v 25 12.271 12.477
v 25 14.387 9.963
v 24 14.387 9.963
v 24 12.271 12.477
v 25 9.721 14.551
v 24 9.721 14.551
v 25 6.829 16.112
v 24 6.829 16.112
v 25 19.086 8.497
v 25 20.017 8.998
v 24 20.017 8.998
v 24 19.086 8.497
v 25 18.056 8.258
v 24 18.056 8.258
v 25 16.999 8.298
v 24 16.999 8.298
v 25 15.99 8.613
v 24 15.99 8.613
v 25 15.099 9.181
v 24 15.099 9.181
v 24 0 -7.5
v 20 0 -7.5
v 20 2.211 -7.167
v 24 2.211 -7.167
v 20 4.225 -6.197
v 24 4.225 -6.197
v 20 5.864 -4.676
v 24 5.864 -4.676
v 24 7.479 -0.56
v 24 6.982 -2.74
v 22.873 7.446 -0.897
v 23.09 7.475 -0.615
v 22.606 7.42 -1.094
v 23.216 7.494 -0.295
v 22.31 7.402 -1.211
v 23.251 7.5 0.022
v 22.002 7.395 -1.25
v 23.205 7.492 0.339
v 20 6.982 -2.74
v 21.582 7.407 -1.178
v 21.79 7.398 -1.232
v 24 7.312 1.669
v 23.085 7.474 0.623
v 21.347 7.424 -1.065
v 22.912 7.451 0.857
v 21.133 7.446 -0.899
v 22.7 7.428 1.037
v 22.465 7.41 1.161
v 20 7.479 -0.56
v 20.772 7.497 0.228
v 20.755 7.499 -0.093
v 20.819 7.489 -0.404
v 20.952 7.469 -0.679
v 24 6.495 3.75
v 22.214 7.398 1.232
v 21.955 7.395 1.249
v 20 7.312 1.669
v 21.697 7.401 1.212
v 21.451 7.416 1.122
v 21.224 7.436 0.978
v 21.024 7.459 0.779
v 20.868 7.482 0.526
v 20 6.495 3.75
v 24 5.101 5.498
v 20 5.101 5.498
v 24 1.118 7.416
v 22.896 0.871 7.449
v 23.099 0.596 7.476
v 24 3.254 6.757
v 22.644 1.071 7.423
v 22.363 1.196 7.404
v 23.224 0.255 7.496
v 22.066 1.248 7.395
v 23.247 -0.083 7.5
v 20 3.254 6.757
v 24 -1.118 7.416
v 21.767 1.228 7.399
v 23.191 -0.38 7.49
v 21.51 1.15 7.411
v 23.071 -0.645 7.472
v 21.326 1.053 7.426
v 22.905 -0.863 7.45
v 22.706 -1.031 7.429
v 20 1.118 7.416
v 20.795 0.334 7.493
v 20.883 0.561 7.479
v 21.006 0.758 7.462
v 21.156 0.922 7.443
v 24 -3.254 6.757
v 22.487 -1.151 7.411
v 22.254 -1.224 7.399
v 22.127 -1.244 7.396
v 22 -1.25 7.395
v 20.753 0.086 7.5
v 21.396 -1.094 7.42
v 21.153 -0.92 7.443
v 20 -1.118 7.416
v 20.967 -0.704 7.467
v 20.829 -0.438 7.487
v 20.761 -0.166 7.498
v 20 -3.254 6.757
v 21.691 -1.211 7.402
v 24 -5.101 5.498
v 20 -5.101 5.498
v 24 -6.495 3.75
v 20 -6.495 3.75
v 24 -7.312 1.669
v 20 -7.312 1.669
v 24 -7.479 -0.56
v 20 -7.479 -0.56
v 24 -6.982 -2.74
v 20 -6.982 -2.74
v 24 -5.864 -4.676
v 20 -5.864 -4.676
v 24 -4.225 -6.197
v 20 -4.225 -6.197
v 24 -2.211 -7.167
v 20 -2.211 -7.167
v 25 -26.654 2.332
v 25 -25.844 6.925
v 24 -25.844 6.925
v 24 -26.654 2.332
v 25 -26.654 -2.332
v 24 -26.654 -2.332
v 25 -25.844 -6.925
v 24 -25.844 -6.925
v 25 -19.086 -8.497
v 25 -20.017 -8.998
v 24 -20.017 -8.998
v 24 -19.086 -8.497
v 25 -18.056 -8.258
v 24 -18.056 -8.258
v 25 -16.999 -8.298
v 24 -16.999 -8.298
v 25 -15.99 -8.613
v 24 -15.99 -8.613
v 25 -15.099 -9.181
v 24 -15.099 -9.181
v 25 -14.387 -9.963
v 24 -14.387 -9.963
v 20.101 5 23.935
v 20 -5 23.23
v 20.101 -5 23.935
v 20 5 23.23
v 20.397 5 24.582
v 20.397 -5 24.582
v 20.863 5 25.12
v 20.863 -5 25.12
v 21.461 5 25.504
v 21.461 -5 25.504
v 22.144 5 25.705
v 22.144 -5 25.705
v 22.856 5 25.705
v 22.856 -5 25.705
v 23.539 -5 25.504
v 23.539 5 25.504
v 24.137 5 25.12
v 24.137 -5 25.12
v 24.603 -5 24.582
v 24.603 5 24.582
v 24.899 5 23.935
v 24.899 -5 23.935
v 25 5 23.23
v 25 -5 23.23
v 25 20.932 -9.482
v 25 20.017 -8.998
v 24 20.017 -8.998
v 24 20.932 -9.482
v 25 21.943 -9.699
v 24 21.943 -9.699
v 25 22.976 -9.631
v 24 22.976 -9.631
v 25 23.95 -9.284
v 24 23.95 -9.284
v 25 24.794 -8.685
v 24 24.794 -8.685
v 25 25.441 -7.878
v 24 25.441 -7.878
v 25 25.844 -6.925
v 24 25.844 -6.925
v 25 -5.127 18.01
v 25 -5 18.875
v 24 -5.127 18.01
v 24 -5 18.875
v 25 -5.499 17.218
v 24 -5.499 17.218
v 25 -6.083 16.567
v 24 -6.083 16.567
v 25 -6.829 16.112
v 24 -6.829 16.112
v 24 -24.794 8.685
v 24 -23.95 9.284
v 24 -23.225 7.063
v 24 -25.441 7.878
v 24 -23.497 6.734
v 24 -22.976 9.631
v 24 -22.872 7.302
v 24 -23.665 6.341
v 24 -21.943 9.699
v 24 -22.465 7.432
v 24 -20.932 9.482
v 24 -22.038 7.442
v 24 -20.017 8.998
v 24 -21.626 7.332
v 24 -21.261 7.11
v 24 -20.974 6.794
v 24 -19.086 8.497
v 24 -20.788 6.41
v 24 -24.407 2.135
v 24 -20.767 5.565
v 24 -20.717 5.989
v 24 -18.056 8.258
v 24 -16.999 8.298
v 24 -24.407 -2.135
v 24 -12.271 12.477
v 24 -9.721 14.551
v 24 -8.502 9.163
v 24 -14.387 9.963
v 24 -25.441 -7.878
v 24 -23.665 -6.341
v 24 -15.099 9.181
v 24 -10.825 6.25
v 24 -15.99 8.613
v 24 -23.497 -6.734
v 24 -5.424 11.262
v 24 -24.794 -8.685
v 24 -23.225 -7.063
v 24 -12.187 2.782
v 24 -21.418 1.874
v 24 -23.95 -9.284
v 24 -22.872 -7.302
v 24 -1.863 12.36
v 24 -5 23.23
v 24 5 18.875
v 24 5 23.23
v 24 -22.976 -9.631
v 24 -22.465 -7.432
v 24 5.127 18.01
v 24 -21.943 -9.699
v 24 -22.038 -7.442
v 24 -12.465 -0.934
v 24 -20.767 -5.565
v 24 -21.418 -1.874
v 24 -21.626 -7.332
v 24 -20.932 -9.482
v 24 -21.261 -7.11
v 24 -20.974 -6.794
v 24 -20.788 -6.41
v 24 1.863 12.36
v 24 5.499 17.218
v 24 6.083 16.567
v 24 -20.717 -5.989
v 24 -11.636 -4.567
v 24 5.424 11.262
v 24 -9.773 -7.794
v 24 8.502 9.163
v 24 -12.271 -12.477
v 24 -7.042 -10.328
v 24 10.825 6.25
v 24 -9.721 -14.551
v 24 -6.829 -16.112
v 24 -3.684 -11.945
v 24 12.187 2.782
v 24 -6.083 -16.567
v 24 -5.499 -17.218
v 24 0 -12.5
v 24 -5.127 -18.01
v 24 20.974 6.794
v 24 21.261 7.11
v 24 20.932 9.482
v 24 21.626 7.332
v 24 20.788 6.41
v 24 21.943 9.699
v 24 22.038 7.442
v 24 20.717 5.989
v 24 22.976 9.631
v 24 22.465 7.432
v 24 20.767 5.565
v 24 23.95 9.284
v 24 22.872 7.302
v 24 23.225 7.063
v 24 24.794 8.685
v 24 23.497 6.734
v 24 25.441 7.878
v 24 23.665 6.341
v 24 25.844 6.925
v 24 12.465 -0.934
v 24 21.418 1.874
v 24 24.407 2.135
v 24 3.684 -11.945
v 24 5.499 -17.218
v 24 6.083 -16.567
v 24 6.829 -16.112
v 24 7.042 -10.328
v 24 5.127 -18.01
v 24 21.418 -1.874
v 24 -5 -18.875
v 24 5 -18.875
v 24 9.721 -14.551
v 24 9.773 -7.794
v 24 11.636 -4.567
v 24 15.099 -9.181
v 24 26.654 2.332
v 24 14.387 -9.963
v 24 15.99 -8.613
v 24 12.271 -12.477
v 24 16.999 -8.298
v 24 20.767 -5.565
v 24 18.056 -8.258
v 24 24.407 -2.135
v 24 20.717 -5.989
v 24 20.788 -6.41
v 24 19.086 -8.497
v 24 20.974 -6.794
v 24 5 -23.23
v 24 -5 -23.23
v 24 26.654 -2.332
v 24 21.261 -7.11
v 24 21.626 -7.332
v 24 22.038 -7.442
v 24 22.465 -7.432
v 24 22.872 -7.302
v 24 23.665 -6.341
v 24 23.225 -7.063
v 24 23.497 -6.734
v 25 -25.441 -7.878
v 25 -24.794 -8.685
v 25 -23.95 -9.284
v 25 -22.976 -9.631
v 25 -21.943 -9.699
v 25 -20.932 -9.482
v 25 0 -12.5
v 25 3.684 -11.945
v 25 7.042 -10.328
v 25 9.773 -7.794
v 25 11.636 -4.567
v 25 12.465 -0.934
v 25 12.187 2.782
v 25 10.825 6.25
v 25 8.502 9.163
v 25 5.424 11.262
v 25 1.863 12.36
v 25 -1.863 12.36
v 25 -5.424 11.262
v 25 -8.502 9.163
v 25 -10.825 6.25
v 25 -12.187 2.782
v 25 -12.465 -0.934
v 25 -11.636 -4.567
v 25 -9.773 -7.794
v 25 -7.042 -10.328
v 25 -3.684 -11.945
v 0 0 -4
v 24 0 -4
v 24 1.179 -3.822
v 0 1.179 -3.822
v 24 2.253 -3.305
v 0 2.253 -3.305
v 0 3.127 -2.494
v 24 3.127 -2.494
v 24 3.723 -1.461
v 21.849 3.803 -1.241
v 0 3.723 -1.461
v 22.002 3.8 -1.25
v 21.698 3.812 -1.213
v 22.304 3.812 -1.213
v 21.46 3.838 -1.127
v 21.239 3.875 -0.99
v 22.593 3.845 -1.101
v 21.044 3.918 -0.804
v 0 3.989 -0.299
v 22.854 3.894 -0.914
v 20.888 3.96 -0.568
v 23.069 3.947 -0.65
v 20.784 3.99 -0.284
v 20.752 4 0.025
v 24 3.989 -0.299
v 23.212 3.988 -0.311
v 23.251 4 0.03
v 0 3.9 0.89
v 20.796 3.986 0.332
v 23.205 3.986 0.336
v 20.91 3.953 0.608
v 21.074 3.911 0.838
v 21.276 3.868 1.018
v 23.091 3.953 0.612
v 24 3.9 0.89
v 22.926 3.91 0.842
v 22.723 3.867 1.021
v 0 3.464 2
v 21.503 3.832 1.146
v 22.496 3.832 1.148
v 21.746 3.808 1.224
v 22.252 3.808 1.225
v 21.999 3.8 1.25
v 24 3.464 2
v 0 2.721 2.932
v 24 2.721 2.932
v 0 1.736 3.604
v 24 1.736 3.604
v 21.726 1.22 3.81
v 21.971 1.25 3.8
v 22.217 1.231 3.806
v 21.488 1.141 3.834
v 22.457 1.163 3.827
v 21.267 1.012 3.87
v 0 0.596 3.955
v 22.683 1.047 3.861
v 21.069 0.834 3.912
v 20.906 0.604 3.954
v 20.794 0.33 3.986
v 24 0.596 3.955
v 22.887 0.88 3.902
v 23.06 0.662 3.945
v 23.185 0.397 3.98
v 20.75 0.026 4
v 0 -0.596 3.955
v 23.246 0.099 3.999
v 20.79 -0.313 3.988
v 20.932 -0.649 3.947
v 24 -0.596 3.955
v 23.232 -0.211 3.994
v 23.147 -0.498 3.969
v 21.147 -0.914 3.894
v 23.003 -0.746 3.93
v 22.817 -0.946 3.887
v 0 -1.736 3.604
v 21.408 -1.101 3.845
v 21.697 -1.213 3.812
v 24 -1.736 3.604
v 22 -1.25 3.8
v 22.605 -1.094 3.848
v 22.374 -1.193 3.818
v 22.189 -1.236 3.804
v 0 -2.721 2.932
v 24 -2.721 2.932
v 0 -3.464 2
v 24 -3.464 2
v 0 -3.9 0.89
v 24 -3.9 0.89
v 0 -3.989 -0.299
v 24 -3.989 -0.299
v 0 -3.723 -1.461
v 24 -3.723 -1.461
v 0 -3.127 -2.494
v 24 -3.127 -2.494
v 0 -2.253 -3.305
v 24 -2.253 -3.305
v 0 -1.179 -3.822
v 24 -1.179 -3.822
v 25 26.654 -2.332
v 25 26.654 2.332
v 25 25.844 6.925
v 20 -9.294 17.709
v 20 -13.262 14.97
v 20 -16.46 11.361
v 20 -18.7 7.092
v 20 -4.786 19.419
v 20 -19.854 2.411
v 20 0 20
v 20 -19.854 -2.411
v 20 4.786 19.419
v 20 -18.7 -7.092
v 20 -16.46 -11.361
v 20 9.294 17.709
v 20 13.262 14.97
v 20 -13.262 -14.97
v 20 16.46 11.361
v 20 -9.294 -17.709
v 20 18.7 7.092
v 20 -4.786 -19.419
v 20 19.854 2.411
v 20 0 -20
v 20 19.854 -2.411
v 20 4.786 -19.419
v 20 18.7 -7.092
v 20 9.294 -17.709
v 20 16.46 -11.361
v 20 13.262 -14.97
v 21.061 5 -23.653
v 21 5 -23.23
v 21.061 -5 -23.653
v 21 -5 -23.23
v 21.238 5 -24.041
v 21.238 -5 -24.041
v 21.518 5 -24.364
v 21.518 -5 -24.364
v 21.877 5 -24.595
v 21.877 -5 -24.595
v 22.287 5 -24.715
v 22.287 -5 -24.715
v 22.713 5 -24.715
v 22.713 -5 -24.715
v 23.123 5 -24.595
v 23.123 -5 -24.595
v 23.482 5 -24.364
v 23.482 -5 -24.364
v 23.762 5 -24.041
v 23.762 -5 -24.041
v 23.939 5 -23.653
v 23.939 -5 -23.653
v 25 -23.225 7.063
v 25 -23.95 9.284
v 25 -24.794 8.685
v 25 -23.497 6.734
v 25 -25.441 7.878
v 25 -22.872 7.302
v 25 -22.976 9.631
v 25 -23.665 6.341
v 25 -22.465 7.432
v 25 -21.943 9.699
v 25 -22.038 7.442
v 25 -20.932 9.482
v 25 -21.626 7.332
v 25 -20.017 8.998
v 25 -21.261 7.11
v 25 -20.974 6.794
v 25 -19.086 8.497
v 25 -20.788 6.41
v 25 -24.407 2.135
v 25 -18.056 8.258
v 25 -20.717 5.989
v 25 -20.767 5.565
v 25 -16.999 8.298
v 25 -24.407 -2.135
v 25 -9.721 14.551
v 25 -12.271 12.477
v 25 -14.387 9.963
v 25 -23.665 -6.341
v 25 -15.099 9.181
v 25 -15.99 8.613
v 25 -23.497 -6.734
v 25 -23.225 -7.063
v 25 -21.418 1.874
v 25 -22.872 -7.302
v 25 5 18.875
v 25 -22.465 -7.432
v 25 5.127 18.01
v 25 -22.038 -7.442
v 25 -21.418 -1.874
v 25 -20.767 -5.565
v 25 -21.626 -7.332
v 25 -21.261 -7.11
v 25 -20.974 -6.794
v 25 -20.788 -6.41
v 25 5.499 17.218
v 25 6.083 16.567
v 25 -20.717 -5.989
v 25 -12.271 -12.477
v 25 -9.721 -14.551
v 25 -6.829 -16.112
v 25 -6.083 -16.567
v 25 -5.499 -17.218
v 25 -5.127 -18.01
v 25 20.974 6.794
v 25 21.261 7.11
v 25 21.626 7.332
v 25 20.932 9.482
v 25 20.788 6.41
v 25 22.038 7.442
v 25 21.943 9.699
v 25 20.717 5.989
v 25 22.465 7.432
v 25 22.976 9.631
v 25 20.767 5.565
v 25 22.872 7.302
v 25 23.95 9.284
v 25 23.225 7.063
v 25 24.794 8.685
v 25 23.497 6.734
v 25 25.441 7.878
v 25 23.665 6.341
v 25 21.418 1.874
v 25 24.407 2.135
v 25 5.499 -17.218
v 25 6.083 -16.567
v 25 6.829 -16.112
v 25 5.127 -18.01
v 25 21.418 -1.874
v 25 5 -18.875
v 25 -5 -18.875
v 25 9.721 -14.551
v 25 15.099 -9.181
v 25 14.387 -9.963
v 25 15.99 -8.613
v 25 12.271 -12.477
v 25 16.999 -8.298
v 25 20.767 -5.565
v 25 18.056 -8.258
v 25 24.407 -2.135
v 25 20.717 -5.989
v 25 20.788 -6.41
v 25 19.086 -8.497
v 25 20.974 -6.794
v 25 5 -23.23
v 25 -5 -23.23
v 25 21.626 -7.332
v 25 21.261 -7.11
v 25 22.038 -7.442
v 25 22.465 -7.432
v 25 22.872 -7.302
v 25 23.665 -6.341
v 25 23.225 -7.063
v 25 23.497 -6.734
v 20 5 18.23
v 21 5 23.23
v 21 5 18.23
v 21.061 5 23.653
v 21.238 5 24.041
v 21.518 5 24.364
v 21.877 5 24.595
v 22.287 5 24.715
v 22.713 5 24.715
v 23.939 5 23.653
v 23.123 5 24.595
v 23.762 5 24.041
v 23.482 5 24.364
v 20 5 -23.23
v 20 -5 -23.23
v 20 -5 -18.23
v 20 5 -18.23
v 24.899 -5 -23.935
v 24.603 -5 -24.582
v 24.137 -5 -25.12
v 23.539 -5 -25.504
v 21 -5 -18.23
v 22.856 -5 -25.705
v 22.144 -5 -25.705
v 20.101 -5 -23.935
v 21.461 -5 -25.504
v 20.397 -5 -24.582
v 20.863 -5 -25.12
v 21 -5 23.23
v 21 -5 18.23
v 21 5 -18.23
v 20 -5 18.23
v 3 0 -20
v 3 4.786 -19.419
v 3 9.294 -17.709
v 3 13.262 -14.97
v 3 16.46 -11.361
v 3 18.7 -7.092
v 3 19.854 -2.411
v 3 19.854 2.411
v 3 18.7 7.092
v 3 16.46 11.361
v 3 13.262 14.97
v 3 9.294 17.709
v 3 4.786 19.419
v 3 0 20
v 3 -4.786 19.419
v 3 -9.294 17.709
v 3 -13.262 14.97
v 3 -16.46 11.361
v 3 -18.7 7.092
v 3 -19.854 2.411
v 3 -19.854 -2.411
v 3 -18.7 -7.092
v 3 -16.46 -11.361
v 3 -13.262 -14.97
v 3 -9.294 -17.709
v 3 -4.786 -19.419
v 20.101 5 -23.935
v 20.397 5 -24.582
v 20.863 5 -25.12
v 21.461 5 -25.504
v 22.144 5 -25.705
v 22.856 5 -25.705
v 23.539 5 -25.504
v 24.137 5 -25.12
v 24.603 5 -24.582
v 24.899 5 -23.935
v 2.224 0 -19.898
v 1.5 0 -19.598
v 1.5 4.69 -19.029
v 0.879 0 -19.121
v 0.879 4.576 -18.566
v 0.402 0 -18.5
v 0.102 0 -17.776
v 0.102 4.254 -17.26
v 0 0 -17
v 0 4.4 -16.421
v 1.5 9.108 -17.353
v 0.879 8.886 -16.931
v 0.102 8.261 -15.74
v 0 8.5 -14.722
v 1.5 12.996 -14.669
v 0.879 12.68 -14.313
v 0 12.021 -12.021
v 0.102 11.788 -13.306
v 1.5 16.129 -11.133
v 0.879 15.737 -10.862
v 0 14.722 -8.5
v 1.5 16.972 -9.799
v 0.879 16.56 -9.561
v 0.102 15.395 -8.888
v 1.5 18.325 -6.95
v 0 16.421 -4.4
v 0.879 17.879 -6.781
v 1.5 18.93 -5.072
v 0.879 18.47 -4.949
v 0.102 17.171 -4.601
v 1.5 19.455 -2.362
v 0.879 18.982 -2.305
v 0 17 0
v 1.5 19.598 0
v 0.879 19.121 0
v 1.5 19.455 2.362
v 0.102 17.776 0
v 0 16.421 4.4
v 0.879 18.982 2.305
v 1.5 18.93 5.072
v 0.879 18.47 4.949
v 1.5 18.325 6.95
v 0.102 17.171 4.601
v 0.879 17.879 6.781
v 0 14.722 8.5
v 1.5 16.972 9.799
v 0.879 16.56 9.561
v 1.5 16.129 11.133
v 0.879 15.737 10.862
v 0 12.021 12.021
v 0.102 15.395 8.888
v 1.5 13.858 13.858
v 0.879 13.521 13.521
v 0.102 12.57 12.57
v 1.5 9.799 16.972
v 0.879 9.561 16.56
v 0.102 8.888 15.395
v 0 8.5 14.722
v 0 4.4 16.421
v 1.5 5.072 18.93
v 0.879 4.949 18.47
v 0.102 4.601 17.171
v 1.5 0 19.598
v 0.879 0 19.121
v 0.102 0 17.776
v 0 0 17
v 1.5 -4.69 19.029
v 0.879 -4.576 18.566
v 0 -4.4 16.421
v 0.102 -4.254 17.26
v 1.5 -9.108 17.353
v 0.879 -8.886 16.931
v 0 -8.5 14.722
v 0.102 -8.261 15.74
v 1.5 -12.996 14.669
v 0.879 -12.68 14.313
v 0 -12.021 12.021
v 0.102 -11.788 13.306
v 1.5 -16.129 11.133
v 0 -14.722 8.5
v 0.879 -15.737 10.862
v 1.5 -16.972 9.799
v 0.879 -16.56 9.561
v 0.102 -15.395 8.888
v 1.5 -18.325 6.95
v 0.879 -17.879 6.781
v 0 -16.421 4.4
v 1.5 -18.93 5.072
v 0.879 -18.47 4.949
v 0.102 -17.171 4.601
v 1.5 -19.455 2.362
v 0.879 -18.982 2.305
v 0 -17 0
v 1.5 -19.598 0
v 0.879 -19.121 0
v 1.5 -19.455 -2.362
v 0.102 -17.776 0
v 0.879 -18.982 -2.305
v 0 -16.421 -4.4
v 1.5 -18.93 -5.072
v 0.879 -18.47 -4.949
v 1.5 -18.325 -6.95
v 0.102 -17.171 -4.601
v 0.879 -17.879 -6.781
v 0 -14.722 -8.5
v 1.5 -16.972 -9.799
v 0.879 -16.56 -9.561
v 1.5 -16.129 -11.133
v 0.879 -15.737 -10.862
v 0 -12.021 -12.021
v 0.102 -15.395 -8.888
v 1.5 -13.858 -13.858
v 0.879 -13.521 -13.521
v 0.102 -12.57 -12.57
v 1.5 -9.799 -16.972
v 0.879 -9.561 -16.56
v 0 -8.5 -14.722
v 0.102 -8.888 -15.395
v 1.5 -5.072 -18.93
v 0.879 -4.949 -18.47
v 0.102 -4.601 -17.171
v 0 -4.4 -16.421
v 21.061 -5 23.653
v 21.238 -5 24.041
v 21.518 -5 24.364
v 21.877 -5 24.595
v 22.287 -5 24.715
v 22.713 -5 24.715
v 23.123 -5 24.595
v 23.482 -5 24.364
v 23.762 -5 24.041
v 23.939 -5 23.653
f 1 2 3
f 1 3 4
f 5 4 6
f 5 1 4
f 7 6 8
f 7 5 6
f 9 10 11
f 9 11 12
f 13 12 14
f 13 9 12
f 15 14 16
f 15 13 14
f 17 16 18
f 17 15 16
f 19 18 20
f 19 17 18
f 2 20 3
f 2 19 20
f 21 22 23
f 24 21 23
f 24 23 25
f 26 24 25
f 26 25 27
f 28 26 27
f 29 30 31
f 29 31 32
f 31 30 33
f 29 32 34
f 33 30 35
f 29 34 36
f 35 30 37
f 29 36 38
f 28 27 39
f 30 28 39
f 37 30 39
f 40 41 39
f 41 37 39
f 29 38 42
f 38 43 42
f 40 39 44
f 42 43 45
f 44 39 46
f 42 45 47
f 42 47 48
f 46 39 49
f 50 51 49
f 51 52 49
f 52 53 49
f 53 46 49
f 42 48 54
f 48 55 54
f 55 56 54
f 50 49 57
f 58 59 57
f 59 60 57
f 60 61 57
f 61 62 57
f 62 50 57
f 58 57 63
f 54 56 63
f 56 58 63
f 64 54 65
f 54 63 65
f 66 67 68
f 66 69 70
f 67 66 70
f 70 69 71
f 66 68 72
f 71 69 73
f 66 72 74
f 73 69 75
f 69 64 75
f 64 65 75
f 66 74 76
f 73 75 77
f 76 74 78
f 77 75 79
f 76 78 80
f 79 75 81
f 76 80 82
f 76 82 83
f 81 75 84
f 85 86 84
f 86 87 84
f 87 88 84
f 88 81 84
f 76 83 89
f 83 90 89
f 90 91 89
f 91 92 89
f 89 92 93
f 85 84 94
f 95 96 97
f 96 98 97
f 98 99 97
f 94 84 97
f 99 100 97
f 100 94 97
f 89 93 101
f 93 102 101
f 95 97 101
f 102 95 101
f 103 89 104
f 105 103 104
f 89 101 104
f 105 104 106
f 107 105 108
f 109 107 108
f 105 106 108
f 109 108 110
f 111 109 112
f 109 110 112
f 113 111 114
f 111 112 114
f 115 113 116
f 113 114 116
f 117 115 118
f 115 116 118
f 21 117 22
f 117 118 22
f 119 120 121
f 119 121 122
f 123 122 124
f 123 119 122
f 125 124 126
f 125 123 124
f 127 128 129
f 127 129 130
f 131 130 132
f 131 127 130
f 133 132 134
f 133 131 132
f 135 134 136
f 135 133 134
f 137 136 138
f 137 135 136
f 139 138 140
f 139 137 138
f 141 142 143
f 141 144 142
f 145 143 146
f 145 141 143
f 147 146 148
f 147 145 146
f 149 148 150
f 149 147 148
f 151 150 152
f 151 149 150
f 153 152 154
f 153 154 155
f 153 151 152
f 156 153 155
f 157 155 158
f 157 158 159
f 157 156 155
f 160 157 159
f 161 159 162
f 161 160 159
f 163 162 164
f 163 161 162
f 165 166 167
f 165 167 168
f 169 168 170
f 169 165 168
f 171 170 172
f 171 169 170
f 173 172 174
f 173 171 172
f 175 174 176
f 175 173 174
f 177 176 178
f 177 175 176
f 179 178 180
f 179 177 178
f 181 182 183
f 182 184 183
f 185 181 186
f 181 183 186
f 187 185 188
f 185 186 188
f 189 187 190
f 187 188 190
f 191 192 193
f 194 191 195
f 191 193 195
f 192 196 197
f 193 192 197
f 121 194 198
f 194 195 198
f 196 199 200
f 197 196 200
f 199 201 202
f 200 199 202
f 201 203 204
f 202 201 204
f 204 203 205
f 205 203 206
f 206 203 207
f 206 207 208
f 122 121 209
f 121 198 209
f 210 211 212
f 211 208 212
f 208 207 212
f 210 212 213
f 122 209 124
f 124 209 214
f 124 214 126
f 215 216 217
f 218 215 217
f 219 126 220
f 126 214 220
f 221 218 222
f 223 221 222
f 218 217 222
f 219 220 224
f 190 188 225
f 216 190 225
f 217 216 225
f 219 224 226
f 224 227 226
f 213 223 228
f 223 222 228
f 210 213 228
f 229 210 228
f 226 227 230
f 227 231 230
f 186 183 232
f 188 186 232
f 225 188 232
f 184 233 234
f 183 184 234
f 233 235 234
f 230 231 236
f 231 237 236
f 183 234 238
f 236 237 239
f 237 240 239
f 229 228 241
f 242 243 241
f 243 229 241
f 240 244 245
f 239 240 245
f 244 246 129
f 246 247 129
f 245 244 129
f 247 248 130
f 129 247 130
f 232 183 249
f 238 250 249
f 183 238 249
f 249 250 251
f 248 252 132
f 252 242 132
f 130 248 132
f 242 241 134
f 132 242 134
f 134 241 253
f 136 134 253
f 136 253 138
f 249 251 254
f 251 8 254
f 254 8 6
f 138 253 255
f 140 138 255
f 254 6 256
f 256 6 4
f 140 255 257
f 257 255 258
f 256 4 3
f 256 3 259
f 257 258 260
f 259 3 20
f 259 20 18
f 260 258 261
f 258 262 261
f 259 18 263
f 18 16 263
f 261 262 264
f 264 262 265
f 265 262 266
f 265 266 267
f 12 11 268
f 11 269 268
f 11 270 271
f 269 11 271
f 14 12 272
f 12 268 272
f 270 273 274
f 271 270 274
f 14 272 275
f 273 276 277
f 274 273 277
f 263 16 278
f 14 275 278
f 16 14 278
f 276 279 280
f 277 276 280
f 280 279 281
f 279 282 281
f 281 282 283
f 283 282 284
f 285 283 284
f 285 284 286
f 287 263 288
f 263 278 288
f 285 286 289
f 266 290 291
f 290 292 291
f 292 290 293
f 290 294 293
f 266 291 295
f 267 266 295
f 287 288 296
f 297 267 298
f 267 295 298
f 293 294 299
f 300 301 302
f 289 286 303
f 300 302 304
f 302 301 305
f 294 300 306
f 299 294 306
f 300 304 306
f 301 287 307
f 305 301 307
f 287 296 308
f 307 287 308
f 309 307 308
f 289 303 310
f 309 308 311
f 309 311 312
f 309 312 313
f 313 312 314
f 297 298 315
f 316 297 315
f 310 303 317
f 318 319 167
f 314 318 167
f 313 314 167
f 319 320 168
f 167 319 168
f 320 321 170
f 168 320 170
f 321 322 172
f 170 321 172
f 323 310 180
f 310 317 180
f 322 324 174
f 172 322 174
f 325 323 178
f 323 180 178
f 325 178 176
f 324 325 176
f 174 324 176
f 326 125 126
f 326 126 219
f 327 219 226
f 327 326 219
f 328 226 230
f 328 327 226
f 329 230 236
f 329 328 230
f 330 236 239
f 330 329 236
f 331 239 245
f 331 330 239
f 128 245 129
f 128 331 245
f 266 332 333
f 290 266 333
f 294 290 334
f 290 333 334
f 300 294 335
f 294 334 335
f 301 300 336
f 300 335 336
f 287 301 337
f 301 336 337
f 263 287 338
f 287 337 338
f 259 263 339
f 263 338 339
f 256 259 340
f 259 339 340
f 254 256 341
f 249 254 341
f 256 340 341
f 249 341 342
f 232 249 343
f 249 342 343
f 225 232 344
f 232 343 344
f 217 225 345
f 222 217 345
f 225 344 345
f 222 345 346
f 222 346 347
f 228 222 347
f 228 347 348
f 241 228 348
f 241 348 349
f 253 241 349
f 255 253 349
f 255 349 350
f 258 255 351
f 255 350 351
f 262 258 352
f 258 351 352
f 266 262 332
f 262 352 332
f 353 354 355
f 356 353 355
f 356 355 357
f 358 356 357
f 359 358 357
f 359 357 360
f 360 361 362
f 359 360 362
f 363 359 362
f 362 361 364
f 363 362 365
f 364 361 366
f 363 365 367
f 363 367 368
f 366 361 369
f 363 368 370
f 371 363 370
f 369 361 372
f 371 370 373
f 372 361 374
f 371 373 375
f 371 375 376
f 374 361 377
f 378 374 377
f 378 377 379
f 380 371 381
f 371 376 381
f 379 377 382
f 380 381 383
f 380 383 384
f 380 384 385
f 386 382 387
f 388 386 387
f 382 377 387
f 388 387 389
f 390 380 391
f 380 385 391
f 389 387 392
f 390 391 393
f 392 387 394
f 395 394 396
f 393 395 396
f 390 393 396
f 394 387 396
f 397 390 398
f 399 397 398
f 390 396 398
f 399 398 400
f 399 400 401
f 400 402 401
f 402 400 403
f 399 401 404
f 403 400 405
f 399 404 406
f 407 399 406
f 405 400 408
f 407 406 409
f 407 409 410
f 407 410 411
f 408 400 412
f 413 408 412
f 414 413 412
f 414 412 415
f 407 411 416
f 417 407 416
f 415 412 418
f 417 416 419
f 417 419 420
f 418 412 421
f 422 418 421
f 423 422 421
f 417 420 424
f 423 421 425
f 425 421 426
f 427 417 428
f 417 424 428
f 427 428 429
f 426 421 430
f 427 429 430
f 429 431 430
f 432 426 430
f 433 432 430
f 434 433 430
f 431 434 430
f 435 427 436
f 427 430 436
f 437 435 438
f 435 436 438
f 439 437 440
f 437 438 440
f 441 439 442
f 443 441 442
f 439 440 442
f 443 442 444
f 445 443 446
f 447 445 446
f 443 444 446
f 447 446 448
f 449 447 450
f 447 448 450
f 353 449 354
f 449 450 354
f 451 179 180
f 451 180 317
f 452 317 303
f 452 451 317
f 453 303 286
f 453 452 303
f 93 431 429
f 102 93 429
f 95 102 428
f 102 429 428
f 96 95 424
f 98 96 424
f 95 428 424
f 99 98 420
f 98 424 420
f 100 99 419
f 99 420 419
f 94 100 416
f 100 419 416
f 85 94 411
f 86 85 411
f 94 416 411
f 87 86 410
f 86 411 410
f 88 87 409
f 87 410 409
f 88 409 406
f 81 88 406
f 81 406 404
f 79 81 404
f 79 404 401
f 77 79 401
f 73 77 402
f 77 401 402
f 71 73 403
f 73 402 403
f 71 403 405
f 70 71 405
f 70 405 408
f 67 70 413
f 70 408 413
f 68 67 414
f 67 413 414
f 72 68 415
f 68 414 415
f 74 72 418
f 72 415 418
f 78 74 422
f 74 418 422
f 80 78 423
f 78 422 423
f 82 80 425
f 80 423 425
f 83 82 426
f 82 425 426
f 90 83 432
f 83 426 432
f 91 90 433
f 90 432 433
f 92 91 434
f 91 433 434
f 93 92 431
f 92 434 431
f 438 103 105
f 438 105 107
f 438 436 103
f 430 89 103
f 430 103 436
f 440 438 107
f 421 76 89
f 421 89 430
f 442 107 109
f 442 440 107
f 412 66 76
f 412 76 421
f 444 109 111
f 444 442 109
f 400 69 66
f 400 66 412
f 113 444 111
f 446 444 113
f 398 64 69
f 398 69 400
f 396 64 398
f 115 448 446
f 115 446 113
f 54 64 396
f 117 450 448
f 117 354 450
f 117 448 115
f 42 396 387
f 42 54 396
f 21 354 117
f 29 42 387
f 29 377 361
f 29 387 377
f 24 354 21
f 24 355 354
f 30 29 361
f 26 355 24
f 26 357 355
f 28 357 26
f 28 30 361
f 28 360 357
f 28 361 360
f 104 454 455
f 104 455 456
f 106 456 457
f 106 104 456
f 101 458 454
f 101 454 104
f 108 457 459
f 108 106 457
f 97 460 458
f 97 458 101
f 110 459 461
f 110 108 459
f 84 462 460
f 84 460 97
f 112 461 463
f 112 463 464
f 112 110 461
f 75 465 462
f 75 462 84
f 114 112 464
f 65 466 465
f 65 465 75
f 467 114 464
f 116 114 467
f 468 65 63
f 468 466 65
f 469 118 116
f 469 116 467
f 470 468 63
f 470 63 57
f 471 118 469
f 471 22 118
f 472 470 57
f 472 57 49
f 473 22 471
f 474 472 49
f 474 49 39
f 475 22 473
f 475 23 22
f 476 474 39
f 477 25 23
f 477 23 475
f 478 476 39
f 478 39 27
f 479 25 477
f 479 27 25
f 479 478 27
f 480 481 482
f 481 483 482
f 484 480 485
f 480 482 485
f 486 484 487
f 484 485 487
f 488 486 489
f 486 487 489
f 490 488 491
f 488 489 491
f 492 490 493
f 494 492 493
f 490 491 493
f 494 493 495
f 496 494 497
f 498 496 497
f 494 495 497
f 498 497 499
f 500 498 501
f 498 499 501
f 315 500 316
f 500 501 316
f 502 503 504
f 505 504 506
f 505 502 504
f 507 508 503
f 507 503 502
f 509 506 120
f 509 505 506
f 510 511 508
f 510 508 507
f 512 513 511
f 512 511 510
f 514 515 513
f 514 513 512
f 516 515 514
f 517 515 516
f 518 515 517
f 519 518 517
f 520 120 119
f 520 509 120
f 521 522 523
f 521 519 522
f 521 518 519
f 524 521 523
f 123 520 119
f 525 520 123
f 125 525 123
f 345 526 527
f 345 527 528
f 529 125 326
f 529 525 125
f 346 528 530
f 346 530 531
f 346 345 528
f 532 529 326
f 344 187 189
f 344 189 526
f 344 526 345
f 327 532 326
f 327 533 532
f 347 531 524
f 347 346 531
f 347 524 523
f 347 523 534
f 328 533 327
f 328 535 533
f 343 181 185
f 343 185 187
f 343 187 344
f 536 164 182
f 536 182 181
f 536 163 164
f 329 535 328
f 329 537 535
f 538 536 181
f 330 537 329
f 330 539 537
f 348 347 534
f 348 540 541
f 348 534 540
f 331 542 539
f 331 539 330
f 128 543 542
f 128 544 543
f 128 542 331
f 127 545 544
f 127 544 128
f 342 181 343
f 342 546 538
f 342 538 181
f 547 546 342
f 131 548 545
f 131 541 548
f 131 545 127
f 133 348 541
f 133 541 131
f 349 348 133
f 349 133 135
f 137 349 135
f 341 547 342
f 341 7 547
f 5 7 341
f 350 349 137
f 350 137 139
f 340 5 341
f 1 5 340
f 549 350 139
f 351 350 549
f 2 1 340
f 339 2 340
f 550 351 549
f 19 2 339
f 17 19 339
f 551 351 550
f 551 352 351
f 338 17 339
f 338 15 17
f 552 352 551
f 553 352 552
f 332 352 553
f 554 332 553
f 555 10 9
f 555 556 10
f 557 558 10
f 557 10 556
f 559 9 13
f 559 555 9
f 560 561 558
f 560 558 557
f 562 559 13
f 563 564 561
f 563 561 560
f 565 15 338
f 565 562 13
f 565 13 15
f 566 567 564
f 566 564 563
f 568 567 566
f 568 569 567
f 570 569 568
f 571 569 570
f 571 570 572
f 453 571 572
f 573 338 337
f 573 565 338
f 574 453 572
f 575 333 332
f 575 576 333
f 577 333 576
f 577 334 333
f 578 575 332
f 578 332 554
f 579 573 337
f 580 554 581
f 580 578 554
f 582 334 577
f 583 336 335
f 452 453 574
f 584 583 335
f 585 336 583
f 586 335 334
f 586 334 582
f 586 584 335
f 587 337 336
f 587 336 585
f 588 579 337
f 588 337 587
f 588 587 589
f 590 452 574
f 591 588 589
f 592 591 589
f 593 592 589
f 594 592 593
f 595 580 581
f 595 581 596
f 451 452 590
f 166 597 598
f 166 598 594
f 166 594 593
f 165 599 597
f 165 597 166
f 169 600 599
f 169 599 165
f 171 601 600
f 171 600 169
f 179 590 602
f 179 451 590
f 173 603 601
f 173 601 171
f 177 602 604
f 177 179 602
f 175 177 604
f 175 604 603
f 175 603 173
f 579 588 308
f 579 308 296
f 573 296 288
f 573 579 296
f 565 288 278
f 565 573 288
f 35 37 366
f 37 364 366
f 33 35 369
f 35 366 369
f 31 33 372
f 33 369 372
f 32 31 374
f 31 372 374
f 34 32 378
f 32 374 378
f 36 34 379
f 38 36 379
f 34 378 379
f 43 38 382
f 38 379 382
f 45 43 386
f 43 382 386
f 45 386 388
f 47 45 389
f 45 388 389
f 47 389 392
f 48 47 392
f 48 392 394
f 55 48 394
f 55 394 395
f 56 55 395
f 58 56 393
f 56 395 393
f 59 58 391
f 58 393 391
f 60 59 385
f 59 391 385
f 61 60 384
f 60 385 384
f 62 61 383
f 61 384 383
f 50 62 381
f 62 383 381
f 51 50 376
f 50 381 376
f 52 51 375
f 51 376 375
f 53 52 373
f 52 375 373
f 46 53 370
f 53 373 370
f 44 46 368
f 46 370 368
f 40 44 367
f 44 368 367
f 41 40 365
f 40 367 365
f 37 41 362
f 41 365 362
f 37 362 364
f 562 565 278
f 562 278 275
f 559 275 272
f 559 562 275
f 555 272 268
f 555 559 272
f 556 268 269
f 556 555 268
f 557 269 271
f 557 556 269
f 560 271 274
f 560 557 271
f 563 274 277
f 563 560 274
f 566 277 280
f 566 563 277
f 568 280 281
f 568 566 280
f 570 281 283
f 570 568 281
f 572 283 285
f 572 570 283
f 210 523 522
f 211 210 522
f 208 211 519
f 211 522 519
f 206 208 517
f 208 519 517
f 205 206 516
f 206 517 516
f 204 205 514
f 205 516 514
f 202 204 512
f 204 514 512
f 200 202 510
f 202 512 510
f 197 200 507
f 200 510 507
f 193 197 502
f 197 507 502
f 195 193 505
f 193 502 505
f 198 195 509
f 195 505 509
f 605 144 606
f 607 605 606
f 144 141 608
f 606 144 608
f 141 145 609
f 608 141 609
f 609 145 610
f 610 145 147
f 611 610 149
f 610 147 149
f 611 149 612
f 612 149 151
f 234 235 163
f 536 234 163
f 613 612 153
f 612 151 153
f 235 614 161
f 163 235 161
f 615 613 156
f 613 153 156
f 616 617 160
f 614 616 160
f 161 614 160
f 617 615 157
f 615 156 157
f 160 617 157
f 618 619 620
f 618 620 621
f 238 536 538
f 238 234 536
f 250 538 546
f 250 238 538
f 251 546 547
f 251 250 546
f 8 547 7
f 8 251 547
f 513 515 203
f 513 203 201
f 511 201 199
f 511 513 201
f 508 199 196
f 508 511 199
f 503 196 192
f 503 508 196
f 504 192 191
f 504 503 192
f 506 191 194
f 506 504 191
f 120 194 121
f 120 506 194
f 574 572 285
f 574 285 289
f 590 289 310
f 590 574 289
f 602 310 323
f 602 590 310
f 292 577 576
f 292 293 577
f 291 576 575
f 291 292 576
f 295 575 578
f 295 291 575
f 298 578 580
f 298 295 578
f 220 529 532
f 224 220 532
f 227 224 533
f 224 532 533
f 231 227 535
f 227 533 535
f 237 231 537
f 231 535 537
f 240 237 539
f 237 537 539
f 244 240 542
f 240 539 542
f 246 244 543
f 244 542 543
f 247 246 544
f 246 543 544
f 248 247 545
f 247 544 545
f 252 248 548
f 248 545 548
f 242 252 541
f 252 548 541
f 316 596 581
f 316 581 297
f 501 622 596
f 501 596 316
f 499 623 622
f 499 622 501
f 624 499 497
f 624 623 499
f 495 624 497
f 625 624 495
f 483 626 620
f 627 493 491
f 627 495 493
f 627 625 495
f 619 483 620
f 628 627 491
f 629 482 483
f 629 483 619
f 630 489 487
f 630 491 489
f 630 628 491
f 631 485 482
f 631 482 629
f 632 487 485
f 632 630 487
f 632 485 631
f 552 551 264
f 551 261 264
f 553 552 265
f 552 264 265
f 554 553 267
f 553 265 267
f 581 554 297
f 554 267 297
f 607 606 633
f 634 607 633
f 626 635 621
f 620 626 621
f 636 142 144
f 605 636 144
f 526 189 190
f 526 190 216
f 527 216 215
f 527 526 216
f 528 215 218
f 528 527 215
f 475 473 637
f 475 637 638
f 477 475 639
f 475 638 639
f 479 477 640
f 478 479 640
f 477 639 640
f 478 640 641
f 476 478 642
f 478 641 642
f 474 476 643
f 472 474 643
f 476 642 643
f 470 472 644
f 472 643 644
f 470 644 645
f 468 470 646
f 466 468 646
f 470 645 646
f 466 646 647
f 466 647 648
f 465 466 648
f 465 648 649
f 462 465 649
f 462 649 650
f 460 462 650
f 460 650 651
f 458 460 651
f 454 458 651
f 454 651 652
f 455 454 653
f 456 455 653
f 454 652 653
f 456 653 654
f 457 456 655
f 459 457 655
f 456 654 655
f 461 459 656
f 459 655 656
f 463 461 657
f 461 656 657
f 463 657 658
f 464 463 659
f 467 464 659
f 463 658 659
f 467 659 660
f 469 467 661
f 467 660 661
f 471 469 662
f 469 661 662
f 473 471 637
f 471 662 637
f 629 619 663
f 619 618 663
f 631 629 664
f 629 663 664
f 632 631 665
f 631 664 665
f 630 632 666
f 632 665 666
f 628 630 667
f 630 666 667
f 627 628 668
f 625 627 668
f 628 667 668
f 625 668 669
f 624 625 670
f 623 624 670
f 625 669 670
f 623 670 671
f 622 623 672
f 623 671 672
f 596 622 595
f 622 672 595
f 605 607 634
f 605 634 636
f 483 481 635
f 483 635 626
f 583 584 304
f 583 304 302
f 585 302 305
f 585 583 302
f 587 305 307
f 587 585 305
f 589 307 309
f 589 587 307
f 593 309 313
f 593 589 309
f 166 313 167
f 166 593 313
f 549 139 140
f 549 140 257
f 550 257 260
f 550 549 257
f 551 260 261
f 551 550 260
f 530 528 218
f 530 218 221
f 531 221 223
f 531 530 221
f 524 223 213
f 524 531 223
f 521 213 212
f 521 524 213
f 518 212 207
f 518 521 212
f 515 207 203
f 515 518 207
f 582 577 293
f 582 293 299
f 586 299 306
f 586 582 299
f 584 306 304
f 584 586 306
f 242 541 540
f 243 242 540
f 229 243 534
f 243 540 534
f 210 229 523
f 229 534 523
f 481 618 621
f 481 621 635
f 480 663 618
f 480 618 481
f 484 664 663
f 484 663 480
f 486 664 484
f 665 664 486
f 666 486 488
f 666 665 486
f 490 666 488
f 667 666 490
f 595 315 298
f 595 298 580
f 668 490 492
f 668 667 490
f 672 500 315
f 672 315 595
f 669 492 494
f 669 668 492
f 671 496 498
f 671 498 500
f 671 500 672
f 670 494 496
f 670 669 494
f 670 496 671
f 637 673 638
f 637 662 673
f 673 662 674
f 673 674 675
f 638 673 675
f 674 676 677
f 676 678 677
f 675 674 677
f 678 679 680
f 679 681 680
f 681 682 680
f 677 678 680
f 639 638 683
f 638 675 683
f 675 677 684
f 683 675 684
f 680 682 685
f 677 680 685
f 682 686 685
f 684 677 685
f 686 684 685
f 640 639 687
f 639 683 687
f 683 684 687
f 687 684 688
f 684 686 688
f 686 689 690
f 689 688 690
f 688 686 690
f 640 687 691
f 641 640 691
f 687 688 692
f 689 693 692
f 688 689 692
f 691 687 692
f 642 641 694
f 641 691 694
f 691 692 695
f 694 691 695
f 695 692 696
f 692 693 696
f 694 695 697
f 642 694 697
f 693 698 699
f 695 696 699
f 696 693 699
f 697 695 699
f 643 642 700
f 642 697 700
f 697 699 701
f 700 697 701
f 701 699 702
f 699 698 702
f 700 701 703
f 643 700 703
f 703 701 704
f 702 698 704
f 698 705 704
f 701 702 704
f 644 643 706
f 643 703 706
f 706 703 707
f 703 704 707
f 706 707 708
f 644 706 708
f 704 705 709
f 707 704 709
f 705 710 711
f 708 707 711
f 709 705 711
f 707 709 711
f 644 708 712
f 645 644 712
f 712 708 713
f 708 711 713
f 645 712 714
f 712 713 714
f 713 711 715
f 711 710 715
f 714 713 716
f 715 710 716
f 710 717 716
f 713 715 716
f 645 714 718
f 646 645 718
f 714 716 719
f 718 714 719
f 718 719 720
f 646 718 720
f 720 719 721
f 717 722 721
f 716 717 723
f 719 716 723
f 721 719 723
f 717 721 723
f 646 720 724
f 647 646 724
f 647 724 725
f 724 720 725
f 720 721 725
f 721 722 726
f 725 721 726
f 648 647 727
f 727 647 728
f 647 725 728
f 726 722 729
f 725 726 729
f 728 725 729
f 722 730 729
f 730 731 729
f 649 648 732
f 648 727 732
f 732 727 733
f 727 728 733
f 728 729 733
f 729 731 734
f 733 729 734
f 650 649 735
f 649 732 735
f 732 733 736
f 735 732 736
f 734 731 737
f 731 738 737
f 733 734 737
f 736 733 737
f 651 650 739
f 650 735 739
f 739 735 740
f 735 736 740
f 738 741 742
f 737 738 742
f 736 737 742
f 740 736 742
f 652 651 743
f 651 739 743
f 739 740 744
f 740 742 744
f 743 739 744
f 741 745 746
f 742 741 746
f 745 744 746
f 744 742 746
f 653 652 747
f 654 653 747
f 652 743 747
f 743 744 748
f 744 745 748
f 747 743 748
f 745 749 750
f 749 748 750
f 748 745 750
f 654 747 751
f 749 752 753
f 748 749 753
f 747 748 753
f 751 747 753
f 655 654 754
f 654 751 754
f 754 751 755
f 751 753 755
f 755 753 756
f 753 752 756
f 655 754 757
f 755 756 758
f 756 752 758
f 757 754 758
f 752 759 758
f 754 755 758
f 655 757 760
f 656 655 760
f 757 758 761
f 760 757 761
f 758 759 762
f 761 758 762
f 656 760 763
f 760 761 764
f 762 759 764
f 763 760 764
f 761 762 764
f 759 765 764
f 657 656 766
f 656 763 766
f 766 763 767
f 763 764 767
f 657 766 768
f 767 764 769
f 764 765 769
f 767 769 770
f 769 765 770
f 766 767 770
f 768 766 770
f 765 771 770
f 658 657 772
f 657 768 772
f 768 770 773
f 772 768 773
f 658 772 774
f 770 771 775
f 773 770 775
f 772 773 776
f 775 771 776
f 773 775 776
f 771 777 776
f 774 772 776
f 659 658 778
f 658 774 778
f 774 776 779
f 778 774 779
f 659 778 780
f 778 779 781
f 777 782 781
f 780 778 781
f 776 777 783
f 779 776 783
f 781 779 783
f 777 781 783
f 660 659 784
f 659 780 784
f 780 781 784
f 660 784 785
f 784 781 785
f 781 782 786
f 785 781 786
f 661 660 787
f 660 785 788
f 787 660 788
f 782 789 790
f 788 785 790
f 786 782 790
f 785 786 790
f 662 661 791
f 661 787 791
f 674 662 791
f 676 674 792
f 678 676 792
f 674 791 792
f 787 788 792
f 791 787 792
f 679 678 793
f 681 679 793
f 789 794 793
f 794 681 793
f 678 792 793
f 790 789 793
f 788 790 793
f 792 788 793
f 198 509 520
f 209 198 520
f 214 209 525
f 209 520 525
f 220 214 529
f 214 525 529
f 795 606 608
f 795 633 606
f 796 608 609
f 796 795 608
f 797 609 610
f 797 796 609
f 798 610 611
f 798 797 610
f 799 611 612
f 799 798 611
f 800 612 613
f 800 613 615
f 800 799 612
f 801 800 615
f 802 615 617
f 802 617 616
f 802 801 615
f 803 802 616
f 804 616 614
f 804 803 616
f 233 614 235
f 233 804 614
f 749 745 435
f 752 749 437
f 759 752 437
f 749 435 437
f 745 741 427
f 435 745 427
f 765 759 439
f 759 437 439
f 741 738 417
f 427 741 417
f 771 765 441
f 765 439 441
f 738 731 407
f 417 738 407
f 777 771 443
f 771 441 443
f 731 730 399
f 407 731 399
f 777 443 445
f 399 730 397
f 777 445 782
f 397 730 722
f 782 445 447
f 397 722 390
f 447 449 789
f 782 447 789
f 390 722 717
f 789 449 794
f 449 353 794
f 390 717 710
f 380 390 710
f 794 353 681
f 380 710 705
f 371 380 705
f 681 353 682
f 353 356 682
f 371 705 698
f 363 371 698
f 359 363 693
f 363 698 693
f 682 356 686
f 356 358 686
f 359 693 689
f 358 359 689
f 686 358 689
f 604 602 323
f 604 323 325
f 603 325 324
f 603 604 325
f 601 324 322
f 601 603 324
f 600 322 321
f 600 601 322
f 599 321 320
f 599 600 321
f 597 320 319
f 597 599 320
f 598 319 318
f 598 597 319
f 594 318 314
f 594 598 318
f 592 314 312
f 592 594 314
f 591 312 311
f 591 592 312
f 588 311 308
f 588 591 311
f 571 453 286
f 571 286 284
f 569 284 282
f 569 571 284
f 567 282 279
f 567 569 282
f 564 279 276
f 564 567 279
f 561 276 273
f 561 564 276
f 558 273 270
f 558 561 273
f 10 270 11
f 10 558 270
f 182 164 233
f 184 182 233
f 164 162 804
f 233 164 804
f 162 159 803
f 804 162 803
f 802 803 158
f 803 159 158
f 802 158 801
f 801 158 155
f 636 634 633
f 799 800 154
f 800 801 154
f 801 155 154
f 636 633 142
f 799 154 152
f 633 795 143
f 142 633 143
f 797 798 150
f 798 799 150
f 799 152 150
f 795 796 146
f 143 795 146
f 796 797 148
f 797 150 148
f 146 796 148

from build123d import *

# Parameters (mm, degrees)
SKETCH1_R                           = 20
BOSS_EXTRUDE1_DEPTH                 = 20
FILLET1_R                           = 3
SKETCH2_R                           = 7.5
BOSS_EXTRUDE2_DEPTH                 = 4
M3X0_5_TAPPED_HOLE1_D               = 2.5
M3X0_5_TAPPED_HOLE1_DEPTH           = 7.5
M3X0_5_TAPPED_HOLE1_TIP             = 0.751075774
M3X0_5_TAPPED_HOLE1_ON_FACE_2_D     = 2.5
M3X0_5_TAPPED_HOLE1_ON_FACE_2_DEPTH = 7.5
M3X0_5_TAPPED_HOLE1_ON_FACE_2_TIP   = 0.751075774
SKETCH5_R                           = 4
CUT_EXTRUDE1_DEPTH                  = 38.09447409
SKETCH6_R                           = 12.5
BOSS_EXTRUDE3_DEPTH                 = 1
FILLET2_R                           = 3
SKETCH35_W                          = 1
SKETCH35_H                          = 10


with BuildPart() as part:
    # Sketch1 → Boss-Extrude1 (new body)
    with BuildSketch(Plane(origin=(0, 0, 0), x_dir=(0, 0, -1), z_dir=(1, 0, 0))):
        Circle(SKETCH1_R)
    extrude(amount=BOSS_EXTRUDE1_DEPTH)

    # Fillet1
    fillet1_edges = [part.edges().sort_by_distance(p)[0] for p in [
        (0, 0, 20),
    ]]
    fillet(fillet1_edges, radius=FILLET1_R)

    # Sketch2 → Boss-Extrude2 (add)
    with BuildSketch(Plane(origin=(20, 0, 0), x_dir=(0, 0, -1), z_dir=(1, 0, 0))):
        Circle(SKETCH2_R)
    extrude(amount=BOSS_EXTRUDE2_DEPTH)

    # M3x0.5 Tapped Hole1
    with Locations(Plane(origin=(22.000008994, -7.4235e-05, 7.5), x_dir=(0, 0.999999999951, 9.89804e-06), z_dir=(0, -9.89804e-06, 0.999999999951))):
        with Locations((0, 0)):
            Hole(M3X0_5_TAPPED_HOLE1_D / 2, depth=M3X0_5_TAPPED_HOLE1_DEPTH)
            with Locations((0, 0, -(M3X0_5_TAPPED_HOLE1_DEPTH + M3X0_5_TAPPED_HOLE1_TIP / 2))):  # 118° drill point
                Cone(0, M3X0_5_TAPPED_HOLE1_D / 2, M3X0_5_TAPPED_HOLE1_TIP, mode=Mode.SUBTRACT)

    # M3x0.5 Tapped Hole1 on face 2
    with Locations(Plane(origin=(22.001585242, 7.499999998, -0.000151303), x_dir=(0, 2e-05, 0.9999999998), z_dir=(0, 0.9999999998, -2e-05))):
        with Locations((0, 0)):
            Hole(M3X0_5_TAPPED_HOLE1_ON_FACE_2_D / 2, depth=M3X0_5_TAPPED_HOLE1_ON_FACE_2_DEPTH)
            with Locations((0, 0, -(M3X0_5_TAPPED_HOLE1_ON_FACE_2_DEPTH + M3X0_5_TAPPED_HOLE1_ON_FACE_2_TIP / 2))):  # 118° drill point
                Cone(0, M3X0_5_TAPPED_HOLE1_ON_FACE_2_D / 2, M3X0_5_TAPPED_HOLE1_ON_FACE_2_TIP, mode=Mode.SUBTRACT)

    # Sketch5 → Cut-Extrude1 (cut, through all)
    with BuildSketch(Plane(origin=(24, 0, 0), x_dir=(0, 0, -1), z_dir=(1, 0, 0))):
        Circle(SKETCH5_R)
    extrude(amount=-CUT_EXTRUDE1_DEPTH, mode=Mode.SUBTRACT)


with BuildPart() as body_2:
    # Sketch6 → Boss-Extrude3 (new body)
    with BuildSketch(Plane(origin=(25, 0, 0), x_dir=(0, 0, -1), z_dir=(1, 0, 0))):
        with BuildLine():
            Line((-23.230409619, -5), (-16.770509831, -5))
            ThreePointArc((-16.770509831, -5), (-14.166860207, -10.273756463), (-9.963037767, -14.387073311))
            ThreePointArc((-9.963037767, -14.387073311), (-8.297848841, -16.999491792), (-8.997537544, -20.01744146))
            ThreePointArc((-8.997537544, -20.01744146), (-9.49130688, -23.475017902), (-6.924880077, -25.844004284))
            ThreePointArc((-6.924880077, -25.844004284), (0, -26.755682042), (6.924880077, -25.844004284))
            ThreePointArc((6.924880077, -25.844004284), (9.49130688, -23.475017902), (8.997537544, -20.01744146))
            ThreePointArc((8.997537544, -20.01744146), (8.297848841, -16.999491792), (9.963037767, -14.387073311))
            ThreePointArc((9.963037767, -14.387073311), (14.166860207, -10.273756463), (16.770509831, -5))
            Line((16.770509831, -5), (23.230409619, -5))
            Line((23.230409619, -5), (23.230409619, 5))
            Line((23.230409619, 5), (16.770509831, 5))
            ThreePointArc((16.770509831, 5), (14.166860207, 10.273756463), (9.963037767, 14.387073311))
            ThreePointArc((9.963037767, 14.387073311), (8.297848841, 16.999491792), (8.997537544, 20.01744146))
            ThreePointArc((8.997537544, 20.01744146), (9.49130688, 23.475017902), (6.924880077, 25.844004284))
            ThreePointArc((6.924880077, 25.844004284), (0, 26.755682042), (-6.924880077, 25.844004284))
            ThreePointArc((-6.924880077, 25.844004284), (-9.49130688, 23.475017902), (-8.997537544, 20.01744146))
            ThreePointArc((-8.997537544, 20.01744146), (-8.297848841, 16.999491792), (-9.963037767, 14.387073311))
            ThreePointArc((-9.963037767, 14.387073311), (-14.166860207, 10.273756463), (-16.770509831, 5))
            Line((-16.770509831, 5), (-23.230409619, 5))
            Line((-23.230409619, 5), (-23.230409619, -5))
        make_face()
        Circle(SKETCH6_R, mode=Mode.SUBTRACT)
        with BuildLine():
            ThreePointArc((5.56460947, 20.767405265), (0, 21.5), (-5.56460947, 20.767405265))
            ThreePointArc((-5.56460947, 20.767405265), (-7.401726777, 21.828065437), (-6.341066605, 23.665182744))
            ThreePointArc((-6.341066605, 23.665182744), (0, 24.5), (6.341066605, 23.665182744))
            ThreePointArc((6.341066605, 23.665182744), (7.401726777, 21.828065437), (5.56460947, 20.767405265))
        make_face(mode=Mode.SUBTRACT)
        with BuildLine():
            ThreePointArc((5.56460947, -20.767405265), (0, -21.5), (-5.56460947, -20.767405265))
            ThreePointArc((-5.56460947, -20.767405265), (-7.401726777, -21.828065437), (-6.341066605, -23.665182744))
            ThreePointArc((-6.341066605, -23.665182744), (0, -24.5), (6.341066605, -23.665182744))
            ThreePointArc((6.341066605, -23.665182744), (7.401726777, -21.828065437), (5.56460947, -20.767405265))
        make_face(mode=Mode.SUBTRACT)
    extrude(amount=-BOSS_EXTRUDE3_DEPTH)

    # Fillet2
    fillet2_edges = [body_2.edges().sort_by_distance(p)[0] for p in [
        (24.5, 5, 16.770509831),
        (24.5, 5, -16.770509831),
        (24.5, -5, -16.770509831),
        (24.5, -5, 16.770509831),
    ]]
    fillet(fillet2_edges, radius=FILLET2_R)

    # Sweep2: sweep along a path in Sketch20
    with BuildLine(Plane(origin=(0, 0, 0), x_dir=(1, 0, 0), z_dir=(0, 1, 0))) as sweep2_path:
        Line((20.5, -18.230409619), (20.5, -23.230409619))
        ThreePointArc((20.5, -23.230409619), (22.5, -25.230409619), (24.5, -23.230409619))
    # Sketch35 → Sweep2 (sweep)
    with BuildSketch(Plane.XY.offset(23.230409619)):
        with Locations((24.5, 0)):
            Rectangle(SKETCH35_W, SKETCH35_H)
    sweep2 = sweep(path=sweep2_path.line)

    # Mirror1: Sweep2 across plane
    add(sweep2.mirror(Plane.XY))


solid = Compound([part.part, body_2.part])
